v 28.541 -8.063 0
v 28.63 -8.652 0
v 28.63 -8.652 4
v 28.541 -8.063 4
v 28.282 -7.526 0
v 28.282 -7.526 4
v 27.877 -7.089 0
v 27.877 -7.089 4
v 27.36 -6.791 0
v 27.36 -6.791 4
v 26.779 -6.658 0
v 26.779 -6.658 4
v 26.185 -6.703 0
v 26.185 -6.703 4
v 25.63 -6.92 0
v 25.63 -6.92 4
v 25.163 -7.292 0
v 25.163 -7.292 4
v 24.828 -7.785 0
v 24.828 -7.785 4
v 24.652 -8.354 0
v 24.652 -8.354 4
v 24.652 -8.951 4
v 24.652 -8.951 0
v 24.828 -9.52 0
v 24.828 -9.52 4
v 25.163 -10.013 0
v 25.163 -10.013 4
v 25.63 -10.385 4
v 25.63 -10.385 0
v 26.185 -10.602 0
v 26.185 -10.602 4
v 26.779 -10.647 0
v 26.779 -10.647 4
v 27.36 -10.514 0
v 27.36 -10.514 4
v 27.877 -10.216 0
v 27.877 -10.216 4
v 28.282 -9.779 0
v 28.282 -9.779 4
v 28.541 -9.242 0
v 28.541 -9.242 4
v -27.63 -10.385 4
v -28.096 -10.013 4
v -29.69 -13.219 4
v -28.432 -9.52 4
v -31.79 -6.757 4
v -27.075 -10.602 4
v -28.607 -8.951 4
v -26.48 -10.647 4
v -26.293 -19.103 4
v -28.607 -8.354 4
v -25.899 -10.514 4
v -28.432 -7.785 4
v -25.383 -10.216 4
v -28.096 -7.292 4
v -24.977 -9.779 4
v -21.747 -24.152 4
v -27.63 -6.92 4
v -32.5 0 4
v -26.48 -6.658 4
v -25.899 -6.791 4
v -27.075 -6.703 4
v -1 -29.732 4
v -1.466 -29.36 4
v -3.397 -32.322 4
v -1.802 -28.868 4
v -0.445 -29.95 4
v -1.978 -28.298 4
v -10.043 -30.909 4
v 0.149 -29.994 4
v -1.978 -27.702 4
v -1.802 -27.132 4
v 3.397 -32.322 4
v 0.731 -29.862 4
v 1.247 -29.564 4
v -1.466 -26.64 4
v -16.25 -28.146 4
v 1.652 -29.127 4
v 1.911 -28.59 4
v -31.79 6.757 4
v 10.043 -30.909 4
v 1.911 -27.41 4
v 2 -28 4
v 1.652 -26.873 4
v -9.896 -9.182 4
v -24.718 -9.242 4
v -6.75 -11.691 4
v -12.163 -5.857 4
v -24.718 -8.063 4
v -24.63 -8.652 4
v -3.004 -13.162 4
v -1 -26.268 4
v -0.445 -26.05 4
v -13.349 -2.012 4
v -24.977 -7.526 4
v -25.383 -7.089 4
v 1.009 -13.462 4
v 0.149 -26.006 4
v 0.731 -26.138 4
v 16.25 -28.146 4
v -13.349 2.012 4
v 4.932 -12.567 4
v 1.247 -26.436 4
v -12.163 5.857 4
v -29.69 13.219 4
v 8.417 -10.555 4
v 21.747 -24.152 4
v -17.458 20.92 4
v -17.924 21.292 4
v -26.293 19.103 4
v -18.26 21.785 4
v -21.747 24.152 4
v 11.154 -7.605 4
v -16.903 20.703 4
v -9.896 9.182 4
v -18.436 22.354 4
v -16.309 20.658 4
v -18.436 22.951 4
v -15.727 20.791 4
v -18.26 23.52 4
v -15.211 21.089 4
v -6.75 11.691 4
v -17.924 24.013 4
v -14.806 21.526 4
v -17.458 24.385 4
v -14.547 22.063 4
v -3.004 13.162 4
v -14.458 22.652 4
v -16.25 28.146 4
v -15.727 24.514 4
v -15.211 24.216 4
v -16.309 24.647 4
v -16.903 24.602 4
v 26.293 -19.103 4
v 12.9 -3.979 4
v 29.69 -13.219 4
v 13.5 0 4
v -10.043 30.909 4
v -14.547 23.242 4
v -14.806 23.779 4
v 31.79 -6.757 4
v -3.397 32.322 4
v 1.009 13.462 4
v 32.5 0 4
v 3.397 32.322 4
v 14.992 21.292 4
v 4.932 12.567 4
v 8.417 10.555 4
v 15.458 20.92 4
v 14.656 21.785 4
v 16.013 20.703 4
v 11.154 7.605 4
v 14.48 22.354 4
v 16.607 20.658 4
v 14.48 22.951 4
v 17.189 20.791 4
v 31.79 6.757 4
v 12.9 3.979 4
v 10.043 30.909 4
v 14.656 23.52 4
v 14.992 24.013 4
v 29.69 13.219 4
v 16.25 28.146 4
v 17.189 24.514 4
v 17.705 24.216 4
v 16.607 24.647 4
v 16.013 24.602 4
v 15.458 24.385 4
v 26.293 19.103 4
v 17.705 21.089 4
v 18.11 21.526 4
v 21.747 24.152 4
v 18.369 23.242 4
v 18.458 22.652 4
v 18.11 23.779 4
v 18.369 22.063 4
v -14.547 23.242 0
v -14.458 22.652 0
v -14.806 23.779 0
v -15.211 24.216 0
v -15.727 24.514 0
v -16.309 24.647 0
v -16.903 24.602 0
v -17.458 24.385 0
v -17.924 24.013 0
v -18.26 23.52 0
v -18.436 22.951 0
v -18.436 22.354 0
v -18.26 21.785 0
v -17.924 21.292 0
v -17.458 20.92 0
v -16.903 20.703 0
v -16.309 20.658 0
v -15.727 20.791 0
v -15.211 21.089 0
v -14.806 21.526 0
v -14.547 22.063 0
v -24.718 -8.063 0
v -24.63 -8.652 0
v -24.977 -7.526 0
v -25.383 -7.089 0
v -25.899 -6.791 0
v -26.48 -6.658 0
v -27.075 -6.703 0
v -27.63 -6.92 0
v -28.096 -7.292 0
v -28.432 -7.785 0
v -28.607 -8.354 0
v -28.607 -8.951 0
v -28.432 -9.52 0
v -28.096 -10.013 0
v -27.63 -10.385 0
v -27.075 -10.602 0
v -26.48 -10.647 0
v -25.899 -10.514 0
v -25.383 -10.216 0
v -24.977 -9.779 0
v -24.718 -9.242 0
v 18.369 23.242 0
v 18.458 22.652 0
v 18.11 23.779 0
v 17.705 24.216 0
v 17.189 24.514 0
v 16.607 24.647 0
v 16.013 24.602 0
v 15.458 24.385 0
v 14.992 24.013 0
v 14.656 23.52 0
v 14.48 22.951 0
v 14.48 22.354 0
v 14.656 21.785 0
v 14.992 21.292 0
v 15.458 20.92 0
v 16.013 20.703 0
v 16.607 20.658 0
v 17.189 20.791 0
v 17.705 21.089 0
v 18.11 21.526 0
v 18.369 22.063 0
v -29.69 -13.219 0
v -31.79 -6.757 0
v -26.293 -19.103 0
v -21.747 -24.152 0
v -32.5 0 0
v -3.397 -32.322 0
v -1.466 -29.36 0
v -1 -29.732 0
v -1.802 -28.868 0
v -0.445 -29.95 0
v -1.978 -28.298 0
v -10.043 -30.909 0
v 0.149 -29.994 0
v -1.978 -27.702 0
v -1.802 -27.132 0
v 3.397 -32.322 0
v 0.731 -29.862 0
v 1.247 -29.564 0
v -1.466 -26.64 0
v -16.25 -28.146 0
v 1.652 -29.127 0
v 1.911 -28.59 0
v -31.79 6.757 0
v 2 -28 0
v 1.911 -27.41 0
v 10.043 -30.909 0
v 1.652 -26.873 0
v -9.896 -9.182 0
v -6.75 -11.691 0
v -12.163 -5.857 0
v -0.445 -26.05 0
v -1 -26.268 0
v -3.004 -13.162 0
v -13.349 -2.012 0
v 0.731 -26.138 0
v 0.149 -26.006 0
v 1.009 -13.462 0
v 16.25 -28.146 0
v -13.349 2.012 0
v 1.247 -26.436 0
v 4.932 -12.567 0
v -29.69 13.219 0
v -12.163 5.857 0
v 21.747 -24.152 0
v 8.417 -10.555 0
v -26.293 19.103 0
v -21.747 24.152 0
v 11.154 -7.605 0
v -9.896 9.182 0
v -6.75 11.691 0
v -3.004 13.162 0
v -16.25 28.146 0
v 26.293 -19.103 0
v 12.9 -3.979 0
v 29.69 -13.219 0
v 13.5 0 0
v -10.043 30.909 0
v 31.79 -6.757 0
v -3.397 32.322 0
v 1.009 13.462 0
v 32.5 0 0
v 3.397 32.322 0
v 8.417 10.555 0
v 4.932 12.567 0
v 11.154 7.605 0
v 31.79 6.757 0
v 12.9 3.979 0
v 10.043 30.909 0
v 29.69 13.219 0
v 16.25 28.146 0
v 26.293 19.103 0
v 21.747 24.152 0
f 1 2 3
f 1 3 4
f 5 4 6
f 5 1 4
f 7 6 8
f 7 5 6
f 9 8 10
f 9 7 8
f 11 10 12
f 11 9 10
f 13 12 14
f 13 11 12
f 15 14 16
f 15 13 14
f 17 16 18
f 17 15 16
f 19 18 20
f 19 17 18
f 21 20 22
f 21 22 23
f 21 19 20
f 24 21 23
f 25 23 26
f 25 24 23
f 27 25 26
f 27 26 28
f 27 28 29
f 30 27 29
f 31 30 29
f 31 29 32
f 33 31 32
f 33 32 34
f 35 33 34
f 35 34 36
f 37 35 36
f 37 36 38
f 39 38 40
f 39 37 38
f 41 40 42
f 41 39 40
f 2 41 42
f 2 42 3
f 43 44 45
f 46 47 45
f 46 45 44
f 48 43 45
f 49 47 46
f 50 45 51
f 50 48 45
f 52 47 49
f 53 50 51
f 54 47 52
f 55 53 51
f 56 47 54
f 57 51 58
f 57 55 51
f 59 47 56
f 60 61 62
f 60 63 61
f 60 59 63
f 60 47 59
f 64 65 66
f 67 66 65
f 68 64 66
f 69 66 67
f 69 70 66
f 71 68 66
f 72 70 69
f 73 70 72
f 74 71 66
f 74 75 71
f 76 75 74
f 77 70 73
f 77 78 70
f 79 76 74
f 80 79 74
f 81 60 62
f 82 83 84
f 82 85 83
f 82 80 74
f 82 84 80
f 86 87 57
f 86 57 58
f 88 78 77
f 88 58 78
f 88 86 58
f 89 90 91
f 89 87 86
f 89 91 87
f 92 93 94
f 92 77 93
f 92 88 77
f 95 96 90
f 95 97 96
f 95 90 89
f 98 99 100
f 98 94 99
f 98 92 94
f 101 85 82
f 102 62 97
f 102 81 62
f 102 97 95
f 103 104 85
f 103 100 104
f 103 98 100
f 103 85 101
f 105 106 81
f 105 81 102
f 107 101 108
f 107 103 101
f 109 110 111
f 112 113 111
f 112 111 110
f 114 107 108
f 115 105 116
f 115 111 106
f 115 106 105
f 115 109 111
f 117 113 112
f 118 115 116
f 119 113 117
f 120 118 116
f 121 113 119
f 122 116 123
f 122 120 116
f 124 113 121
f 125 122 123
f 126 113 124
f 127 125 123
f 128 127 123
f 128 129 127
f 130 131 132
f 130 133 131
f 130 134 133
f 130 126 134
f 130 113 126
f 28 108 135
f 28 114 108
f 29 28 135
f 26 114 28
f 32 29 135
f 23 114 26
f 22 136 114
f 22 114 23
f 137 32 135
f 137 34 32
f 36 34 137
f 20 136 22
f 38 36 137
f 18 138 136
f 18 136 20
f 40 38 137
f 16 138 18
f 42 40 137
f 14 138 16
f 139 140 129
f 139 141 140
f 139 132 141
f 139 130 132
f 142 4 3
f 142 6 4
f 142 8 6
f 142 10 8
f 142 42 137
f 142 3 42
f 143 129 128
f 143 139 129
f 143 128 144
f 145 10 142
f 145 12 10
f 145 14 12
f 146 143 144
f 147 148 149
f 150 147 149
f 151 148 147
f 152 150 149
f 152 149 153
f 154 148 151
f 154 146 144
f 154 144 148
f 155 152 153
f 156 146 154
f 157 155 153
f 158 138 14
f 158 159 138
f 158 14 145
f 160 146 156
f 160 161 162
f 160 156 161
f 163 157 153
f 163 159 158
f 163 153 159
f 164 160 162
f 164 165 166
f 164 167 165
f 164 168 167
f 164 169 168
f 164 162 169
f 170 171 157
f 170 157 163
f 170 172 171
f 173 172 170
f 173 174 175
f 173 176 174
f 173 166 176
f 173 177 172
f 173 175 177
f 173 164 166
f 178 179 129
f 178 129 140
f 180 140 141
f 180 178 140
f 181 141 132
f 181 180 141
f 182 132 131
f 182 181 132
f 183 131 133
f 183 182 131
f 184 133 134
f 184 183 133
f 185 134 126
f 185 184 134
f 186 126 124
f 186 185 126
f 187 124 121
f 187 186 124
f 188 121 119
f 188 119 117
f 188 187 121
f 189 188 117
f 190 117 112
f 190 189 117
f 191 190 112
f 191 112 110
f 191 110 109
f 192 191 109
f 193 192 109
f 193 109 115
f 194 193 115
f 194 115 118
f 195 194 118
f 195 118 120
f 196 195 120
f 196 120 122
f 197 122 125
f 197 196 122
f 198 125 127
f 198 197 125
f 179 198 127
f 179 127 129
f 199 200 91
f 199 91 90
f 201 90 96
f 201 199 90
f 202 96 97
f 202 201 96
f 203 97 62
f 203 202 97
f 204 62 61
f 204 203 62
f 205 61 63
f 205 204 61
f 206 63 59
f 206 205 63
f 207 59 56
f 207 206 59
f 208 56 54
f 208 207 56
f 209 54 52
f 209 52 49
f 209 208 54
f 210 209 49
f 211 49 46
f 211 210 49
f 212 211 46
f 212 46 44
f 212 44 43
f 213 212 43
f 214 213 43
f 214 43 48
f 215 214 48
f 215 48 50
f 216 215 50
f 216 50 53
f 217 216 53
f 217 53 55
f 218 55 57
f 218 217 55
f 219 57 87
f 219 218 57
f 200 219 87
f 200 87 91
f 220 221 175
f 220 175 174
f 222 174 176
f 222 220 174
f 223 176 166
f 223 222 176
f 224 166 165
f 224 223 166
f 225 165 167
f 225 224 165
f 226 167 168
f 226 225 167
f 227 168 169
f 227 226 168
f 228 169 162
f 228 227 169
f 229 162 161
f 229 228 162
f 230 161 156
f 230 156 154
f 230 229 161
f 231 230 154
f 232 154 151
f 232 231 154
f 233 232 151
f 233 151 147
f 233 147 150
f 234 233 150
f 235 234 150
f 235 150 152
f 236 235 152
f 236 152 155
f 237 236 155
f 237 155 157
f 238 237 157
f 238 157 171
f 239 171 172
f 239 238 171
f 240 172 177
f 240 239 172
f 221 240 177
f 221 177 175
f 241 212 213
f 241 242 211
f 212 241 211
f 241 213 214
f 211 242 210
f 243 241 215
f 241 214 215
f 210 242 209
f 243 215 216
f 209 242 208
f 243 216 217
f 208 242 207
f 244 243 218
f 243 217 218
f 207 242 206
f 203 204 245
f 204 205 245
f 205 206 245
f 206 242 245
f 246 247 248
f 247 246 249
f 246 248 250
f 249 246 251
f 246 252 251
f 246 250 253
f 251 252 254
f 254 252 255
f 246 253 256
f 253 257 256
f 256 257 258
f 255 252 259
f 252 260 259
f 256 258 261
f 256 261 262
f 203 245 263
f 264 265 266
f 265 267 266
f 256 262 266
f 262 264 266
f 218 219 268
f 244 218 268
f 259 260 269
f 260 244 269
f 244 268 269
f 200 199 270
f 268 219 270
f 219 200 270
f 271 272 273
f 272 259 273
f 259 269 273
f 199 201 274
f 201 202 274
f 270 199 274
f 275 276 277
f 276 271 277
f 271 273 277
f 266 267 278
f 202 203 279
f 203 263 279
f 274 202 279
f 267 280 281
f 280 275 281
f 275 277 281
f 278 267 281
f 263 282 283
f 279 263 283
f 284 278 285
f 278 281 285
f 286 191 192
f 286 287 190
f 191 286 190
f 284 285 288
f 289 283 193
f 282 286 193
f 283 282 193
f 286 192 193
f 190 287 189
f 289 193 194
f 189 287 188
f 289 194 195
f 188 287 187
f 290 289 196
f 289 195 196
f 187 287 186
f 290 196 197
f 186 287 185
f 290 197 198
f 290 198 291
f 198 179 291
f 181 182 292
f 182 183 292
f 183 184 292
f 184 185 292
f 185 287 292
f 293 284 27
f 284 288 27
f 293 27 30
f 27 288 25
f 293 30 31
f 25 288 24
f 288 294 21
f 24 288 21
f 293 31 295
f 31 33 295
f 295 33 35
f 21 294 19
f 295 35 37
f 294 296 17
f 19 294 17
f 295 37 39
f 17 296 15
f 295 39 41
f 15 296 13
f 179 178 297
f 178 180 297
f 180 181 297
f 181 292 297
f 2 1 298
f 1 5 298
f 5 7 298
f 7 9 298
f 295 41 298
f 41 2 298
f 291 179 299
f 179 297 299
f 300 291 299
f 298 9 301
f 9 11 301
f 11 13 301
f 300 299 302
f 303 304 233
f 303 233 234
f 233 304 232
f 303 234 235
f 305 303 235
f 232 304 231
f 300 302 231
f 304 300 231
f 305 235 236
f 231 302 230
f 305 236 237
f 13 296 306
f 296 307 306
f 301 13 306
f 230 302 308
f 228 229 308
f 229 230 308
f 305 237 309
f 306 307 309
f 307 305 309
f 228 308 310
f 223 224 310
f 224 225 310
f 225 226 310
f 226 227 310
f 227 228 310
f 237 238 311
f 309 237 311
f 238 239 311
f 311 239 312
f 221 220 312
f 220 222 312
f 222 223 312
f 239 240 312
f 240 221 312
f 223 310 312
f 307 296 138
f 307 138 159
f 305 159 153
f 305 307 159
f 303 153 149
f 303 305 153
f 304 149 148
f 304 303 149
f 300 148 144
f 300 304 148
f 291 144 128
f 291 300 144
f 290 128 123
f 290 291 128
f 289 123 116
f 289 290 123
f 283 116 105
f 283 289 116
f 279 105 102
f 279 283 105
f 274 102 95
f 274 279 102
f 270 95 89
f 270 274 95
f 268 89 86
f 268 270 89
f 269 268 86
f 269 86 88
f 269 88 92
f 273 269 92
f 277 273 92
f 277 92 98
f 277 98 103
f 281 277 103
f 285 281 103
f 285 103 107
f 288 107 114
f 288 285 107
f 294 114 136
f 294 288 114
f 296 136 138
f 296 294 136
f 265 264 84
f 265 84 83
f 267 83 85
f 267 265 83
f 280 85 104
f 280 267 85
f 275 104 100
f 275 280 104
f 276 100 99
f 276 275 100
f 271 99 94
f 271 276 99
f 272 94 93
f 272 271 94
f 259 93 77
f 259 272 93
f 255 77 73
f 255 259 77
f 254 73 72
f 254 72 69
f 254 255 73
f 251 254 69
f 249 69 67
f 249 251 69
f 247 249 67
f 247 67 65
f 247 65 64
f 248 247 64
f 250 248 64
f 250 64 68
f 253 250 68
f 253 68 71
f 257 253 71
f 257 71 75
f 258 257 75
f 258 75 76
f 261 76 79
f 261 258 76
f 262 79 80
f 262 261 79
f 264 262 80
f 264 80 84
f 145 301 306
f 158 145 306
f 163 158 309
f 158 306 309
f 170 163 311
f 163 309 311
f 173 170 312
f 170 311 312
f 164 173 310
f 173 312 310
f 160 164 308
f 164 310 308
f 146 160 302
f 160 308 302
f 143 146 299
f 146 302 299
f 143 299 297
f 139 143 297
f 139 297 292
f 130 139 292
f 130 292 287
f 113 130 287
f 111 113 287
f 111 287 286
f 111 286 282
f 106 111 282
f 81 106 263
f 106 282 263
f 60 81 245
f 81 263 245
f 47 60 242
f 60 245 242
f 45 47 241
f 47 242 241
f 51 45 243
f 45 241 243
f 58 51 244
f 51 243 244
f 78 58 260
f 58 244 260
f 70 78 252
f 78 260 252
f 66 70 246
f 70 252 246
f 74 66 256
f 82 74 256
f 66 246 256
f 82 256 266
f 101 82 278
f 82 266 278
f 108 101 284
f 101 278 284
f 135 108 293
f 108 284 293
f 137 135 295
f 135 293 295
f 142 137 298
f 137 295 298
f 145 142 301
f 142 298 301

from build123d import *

# Parameters (mm, degrees)
SKETCH_1_R      = 32.5
SKETCH_1_R_2    = 13.5
SKETCH_1_R_3    = 2
EXTRUDE_1_DEPTH = 4


with BuildPart() as part:
    # 草图1 → 凸台-拉伸1 (new body)
    with BuildSketch(Plane.XY):
        Circle(SKETCH_1_R)
        Circle(SKETCH_1_R_2, mode=Mode.SUBTRACT)
        with Locations((0, -28)):
            Circle(SKETCH_1_R_3, mode=Mode.SUBTRACT)
        with Locations((-26.629582456, -8.652475842)):
            Circle(SKETCH_1_R_3, mode=Mode.SUBTRACT)
        with Locations((-16.457987064, 22.652475842)):
            Circle(SKETCH_1_R_3, mode=Mode.SUBTRACT)
        with Locations((16.457987064, 22.652475842)):
            Circle(SKETCH_1_R_3, mode=Mode.SUBTRACT)
        with Locations((26.629582456, -8.652475842)):
            Circle(SKETCH_1_R_3, mode=Mode.SUBTRACT)
    extrude(amount=EXTRUDE_1_DEPTH)


solid = part.part
